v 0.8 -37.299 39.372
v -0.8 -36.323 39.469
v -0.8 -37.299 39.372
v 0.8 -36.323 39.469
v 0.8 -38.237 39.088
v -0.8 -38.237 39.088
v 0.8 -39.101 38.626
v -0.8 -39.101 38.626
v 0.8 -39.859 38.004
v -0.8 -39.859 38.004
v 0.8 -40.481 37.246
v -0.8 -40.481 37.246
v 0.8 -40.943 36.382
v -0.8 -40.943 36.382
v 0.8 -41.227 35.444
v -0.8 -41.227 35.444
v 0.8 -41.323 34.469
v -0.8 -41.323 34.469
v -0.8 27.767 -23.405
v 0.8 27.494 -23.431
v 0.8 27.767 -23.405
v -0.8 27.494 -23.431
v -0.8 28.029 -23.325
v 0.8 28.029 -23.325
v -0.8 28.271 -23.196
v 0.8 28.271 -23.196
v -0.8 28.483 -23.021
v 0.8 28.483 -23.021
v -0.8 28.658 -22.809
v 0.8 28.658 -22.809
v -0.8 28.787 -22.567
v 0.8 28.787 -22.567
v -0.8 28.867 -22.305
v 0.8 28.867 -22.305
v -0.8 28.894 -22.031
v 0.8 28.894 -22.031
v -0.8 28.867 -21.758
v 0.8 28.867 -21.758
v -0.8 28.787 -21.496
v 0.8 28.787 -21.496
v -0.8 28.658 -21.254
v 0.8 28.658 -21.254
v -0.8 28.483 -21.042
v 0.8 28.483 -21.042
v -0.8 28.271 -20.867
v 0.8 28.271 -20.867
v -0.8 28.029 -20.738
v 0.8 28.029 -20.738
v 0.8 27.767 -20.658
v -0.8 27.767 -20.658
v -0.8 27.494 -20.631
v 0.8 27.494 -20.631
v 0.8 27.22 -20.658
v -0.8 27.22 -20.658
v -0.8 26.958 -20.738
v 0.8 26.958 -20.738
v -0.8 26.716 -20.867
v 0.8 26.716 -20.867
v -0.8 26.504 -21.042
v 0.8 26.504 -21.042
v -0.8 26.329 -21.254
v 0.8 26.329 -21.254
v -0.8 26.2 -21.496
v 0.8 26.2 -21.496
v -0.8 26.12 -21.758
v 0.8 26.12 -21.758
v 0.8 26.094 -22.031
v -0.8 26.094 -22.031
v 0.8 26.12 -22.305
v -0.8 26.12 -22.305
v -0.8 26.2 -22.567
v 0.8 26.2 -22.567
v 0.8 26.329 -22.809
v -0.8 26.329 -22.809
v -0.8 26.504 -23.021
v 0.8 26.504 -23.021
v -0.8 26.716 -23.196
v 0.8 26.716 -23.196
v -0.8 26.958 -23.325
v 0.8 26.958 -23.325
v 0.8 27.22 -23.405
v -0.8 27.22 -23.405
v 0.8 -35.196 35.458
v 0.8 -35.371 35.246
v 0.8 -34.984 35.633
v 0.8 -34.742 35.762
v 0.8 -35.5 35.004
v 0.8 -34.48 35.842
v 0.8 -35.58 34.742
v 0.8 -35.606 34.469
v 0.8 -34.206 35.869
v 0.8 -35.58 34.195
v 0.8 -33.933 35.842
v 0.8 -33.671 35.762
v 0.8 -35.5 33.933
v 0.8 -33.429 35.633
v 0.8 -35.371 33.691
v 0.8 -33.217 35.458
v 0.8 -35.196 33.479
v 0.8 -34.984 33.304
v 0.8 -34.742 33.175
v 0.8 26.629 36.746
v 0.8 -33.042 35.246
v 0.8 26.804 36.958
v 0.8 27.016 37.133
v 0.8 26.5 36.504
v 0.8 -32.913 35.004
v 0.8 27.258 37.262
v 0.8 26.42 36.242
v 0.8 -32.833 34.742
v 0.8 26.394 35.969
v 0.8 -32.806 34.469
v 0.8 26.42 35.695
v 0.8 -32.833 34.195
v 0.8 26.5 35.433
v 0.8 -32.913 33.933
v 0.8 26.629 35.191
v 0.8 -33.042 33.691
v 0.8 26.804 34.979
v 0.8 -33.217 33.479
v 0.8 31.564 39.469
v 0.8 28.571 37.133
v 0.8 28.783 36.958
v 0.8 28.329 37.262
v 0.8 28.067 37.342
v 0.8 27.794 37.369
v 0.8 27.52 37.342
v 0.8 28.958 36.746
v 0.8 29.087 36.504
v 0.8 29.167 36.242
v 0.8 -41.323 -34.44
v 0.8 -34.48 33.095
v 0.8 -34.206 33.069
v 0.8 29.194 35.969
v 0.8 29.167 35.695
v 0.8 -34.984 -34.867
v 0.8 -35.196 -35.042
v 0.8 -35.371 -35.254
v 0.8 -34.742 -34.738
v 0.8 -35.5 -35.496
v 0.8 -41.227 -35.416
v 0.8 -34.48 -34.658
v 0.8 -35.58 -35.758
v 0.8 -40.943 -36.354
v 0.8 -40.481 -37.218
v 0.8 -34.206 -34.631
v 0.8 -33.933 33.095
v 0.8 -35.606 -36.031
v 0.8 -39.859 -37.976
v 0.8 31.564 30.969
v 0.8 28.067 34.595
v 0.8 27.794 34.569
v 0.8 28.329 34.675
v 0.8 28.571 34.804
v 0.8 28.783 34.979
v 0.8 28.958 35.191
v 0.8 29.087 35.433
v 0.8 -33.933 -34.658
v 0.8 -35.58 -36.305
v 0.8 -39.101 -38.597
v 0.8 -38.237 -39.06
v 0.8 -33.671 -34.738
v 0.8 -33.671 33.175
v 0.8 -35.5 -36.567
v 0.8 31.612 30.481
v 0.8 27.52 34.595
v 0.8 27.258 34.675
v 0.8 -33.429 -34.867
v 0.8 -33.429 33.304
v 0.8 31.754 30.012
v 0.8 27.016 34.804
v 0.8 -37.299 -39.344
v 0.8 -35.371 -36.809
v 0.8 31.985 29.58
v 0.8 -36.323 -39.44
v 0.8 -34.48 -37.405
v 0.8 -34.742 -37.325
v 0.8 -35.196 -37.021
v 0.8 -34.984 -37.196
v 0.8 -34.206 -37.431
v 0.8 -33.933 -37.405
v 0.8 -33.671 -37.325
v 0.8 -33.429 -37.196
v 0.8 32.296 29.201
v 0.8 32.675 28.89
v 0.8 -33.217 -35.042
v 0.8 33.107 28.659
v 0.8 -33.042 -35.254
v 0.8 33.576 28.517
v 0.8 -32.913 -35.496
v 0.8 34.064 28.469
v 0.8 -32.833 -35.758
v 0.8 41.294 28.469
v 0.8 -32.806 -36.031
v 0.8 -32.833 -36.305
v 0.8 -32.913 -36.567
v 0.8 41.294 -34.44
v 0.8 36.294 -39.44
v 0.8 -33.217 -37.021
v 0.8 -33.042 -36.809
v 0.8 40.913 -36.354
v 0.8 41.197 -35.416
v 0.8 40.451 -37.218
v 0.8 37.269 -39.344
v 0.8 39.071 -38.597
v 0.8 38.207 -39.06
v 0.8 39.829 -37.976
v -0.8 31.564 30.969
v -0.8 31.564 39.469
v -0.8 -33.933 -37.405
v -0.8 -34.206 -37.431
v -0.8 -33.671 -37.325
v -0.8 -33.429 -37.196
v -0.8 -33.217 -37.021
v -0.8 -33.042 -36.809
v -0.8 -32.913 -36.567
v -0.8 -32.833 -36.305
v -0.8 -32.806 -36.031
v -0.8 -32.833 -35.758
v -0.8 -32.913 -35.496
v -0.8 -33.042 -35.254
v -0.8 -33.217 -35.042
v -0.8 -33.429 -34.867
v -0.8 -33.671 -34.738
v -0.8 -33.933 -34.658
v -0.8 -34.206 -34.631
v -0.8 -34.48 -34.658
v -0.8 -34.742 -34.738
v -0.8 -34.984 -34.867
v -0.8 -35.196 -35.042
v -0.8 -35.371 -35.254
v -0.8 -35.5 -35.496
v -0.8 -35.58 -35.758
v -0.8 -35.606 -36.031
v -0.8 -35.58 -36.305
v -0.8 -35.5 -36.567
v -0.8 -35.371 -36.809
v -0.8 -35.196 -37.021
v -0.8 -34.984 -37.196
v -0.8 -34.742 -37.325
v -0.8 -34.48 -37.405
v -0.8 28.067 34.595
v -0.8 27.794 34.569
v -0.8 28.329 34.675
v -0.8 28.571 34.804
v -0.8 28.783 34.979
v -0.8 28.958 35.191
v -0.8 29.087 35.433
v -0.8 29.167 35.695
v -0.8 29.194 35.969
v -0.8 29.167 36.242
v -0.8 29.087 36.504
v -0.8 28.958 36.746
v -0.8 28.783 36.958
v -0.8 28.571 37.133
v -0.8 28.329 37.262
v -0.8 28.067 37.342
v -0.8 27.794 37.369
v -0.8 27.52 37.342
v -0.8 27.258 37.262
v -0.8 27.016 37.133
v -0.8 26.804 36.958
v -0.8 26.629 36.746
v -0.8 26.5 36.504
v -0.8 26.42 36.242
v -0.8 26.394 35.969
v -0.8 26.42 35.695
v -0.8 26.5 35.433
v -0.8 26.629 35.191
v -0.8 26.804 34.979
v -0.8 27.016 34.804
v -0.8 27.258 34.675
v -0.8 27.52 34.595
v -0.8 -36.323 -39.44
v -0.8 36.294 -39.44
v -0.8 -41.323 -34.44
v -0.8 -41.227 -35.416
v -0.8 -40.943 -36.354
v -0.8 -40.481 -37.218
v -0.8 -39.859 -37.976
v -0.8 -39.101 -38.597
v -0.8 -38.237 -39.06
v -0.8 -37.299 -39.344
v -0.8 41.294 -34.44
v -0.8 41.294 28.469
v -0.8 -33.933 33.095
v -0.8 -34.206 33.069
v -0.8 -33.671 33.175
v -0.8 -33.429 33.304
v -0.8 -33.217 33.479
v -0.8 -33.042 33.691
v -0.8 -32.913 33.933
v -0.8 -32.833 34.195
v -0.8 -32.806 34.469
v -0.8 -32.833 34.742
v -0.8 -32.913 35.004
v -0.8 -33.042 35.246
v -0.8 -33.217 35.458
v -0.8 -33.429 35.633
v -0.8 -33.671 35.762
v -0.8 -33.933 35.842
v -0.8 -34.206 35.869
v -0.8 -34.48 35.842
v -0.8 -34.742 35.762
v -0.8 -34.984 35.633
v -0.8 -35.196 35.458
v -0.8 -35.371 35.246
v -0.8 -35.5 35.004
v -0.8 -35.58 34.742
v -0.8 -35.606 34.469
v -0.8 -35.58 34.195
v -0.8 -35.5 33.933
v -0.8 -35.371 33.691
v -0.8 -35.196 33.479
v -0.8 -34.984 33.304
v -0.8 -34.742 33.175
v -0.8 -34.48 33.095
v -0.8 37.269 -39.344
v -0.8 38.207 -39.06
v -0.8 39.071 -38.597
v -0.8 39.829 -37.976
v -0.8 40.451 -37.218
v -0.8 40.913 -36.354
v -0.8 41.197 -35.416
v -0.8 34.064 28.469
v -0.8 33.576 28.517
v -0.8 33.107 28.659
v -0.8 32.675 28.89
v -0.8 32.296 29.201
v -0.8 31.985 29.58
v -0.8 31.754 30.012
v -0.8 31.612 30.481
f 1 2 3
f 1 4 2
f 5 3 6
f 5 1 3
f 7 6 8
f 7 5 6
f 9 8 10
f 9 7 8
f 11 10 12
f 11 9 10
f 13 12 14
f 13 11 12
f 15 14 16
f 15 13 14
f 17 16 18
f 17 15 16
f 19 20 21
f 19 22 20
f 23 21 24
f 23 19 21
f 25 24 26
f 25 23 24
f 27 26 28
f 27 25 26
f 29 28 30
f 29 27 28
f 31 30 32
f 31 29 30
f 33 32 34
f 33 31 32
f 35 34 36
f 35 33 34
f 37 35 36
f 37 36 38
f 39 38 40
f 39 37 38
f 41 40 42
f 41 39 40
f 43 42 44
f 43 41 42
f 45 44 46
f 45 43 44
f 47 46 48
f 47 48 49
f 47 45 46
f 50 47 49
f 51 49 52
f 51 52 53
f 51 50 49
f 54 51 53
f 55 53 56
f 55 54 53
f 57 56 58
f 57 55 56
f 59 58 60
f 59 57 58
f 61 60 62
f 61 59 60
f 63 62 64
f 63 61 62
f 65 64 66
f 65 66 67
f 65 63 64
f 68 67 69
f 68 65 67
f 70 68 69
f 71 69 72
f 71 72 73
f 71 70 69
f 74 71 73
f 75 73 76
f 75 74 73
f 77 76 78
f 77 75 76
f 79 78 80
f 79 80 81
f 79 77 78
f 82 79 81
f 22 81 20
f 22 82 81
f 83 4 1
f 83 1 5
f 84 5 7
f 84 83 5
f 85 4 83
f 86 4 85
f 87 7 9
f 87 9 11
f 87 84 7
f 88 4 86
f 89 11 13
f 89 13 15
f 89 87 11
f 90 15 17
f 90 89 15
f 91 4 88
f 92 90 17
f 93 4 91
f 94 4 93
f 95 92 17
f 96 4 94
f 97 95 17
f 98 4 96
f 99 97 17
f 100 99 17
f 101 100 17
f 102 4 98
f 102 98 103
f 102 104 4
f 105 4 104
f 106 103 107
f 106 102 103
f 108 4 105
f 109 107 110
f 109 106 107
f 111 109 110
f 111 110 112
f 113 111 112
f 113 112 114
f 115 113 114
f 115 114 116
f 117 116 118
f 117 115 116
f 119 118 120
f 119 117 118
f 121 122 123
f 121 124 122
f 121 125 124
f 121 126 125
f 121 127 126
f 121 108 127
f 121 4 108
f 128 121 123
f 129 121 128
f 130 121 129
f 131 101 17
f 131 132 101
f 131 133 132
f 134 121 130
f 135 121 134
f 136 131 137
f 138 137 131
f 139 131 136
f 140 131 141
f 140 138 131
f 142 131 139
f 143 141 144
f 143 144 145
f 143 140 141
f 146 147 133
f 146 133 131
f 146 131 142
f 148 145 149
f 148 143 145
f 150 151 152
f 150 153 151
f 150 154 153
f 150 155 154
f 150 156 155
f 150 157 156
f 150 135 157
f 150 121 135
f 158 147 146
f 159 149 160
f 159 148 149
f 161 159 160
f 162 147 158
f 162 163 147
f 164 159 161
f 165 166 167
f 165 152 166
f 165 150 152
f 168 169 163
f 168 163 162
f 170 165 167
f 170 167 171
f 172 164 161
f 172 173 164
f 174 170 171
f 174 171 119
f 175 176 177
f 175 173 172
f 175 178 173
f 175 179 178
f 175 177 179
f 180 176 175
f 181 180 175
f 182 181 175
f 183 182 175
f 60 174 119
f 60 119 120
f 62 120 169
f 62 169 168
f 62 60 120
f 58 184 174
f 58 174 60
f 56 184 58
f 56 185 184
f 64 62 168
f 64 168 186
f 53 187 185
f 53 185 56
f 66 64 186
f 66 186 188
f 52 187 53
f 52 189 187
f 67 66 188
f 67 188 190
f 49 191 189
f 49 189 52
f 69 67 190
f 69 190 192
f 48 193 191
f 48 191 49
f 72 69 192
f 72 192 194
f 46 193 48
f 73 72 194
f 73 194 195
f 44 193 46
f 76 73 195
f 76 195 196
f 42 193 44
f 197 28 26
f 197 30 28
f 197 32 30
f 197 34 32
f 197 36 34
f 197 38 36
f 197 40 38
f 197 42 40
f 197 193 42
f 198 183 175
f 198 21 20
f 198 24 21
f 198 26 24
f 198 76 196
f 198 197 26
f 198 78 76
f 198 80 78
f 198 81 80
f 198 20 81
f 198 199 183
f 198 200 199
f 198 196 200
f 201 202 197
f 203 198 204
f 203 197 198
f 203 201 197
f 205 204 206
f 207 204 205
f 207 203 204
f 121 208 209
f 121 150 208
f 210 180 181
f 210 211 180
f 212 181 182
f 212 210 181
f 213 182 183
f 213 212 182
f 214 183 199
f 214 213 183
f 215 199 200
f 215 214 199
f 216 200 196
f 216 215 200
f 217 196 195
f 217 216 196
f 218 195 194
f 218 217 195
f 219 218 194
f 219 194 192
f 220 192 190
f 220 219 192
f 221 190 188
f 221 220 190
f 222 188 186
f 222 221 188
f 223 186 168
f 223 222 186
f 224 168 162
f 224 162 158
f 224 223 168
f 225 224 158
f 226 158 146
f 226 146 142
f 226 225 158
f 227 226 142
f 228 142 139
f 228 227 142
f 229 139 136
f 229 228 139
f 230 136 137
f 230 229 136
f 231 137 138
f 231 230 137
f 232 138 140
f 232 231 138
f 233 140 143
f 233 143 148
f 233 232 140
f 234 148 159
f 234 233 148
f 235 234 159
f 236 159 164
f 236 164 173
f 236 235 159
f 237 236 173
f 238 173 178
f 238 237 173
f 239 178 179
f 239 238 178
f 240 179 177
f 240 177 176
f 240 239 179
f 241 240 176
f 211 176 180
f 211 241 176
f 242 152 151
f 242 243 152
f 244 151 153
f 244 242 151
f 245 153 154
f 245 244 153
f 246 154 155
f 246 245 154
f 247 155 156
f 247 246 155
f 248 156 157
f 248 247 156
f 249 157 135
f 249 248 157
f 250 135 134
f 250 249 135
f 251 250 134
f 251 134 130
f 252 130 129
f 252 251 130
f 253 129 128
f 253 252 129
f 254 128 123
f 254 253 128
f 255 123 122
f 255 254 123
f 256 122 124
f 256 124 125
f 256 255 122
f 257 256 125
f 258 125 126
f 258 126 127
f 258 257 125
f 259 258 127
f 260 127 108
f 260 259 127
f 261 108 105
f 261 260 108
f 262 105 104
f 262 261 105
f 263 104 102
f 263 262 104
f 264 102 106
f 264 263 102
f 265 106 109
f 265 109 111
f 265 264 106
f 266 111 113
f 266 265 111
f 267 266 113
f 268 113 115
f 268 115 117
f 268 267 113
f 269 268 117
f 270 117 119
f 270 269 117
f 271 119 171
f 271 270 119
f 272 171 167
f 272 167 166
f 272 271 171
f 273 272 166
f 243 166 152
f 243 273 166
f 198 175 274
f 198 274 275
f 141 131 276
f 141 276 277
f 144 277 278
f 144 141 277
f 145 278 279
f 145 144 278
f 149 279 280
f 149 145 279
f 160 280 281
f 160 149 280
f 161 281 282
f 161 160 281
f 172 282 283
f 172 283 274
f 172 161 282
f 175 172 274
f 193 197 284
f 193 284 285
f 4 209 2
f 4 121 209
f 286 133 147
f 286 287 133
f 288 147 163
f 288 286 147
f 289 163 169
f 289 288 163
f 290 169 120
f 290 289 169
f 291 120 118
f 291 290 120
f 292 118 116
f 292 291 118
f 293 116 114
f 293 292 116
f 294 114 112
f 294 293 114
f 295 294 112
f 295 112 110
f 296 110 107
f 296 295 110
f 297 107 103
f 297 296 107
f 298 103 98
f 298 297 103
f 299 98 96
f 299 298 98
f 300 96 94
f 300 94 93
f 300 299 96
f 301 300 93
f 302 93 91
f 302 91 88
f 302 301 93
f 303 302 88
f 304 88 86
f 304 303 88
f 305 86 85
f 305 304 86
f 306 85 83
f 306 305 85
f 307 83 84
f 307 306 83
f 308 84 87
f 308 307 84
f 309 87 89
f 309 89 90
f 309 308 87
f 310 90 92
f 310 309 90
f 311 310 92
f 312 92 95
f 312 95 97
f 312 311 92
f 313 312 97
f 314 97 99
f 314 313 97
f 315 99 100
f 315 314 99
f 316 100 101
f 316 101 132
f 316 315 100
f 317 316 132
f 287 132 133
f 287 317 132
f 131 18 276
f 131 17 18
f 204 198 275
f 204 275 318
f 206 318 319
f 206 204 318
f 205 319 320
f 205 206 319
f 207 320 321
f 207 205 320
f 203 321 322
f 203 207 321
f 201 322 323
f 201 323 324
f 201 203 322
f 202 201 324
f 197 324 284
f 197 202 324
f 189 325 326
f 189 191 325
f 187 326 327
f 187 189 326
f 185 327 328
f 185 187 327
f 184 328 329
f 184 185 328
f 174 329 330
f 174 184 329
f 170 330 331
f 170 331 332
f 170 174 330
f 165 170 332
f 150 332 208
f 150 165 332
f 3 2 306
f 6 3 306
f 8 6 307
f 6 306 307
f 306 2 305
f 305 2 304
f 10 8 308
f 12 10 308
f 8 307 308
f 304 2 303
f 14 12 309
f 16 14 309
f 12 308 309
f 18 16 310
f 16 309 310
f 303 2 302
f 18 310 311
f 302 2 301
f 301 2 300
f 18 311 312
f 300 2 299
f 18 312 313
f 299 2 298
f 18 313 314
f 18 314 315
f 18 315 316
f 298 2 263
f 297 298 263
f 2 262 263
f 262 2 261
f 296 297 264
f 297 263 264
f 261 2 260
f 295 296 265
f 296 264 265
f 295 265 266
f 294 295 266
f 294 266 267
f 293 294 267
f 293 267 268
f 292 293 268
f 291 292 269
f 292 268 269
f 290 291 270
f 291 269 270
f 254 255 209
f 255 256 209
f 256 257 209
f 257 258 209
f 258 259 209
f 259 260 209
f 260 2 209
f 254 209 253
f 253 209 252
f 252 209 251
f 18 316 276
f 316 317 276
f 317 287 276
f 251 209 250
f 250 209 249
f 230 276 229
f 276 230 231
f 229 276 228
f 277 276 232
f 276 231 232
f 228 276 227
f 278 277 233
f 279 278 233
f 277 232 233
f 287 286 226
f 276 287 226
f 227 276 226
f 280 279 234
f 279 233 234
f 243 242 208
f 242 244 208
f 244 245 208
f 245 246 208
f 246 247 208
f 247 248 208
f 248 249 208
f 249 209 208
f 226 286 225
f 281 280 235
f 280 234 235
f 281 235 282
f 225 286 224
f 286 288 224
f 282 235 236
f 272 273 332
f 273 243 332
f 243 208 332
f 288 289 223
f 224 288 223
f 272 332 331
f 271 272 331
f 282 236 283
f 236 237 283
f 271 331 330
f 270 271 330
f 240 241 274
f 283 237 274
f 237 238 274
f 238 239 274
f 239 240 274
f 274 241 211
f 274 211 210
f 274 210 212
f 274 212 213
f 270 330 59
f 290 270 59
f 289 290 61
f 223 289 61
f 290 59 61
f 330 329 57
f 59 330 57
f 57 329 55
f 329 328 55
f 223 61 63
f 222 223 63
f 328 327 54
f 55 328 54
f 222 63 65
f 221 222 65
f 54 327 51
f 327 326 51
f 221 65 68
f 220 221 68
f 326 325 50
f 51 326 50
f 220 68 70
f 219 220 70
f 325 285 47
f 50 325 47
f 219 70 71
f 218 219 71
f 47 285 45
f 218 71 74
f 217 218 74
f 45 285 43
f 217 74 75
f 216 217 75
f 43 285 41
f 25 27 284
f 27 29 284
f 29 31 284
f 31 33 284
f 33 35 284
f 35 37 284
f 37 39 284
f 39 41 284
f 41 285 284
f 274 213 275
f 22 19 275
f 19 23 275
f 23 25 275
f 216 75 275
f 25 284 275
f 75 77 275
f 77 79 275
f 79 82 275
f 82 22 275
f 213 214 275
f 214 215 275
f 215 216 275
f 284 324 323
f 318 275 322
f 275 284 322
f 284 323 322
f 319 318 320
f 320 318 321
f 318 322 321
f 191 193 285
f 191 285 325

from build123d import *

# Parameters (mm, degrees)
SKETCH1_R           = 1.4
BOSS_EXTRUDE1_DEPTH = 0.8


with BuildPart() as part:
    # Sketch1 → Boss-Extrude1 (new, symmetric)
    with BuildSketch(Plane(origin=(0, 0, 0), x_dir=(0, 0, -1), z_dir=(1, 0, 0))):
        with BuildLine():
            Line((-34.468542217, -41.323283133), (34.440131171, -41.323283133))
            ThreePointArc((34.440131171, -41.323283133), (37.975665077, -39.858817038), (39.440131171, -36.323283133))
            Line((39.440131171, -36.323283133), (39.440131171, 36.293536969))
            ThreePointArc((39.440131171, 36.293536969), (37.975665077, 39.829070875), (34.440131171, 41.293536969))
            Line((34.440131171, 41.293536969), (-28.468542217, 41.293536969))
            Line((-28.468542217, 41.293536969), (-28.468542217, 34.063536969))
            ThreePointArc((-28.468542217, 34.063536969), (-29.200775264, 32.295770016), (-30.968542217, 31.563536969))
            Line((-30.968542217, 31.563536969), (-39.468542217, 31.563536969))
            Line((-39.468542217, 31.563536969), (-39.468542217, -36.323283133))
            ThreePointArc((-39.468542217, -36.323283133), (-38.004076123, -39.858817038), (-34.468542217, -41.323283133))
        make_face()
        with Locations((-35.968542217, 27.793536969)):
            Circle(SKETCH1_R, mode=Mode.SUBTRACT)
        with Locations((22.031457783, 27.493536969)):
            Circle(SKETCH1_R, mode=Mode.SUBTRACT)
        with Locations((-34.468542217, -34.206463031)):
            Circle(SKETCH1_R, mode=Mode.SUBTRACT)
        with Locations((36.031457783, -34.206463031)):
            Circle(SKETCH1_R, mode=Mode.SUBTRACT)
    extrude(amount=BOSS_EXTRUDE1_DEPTH, both=True)


solid = part.part
